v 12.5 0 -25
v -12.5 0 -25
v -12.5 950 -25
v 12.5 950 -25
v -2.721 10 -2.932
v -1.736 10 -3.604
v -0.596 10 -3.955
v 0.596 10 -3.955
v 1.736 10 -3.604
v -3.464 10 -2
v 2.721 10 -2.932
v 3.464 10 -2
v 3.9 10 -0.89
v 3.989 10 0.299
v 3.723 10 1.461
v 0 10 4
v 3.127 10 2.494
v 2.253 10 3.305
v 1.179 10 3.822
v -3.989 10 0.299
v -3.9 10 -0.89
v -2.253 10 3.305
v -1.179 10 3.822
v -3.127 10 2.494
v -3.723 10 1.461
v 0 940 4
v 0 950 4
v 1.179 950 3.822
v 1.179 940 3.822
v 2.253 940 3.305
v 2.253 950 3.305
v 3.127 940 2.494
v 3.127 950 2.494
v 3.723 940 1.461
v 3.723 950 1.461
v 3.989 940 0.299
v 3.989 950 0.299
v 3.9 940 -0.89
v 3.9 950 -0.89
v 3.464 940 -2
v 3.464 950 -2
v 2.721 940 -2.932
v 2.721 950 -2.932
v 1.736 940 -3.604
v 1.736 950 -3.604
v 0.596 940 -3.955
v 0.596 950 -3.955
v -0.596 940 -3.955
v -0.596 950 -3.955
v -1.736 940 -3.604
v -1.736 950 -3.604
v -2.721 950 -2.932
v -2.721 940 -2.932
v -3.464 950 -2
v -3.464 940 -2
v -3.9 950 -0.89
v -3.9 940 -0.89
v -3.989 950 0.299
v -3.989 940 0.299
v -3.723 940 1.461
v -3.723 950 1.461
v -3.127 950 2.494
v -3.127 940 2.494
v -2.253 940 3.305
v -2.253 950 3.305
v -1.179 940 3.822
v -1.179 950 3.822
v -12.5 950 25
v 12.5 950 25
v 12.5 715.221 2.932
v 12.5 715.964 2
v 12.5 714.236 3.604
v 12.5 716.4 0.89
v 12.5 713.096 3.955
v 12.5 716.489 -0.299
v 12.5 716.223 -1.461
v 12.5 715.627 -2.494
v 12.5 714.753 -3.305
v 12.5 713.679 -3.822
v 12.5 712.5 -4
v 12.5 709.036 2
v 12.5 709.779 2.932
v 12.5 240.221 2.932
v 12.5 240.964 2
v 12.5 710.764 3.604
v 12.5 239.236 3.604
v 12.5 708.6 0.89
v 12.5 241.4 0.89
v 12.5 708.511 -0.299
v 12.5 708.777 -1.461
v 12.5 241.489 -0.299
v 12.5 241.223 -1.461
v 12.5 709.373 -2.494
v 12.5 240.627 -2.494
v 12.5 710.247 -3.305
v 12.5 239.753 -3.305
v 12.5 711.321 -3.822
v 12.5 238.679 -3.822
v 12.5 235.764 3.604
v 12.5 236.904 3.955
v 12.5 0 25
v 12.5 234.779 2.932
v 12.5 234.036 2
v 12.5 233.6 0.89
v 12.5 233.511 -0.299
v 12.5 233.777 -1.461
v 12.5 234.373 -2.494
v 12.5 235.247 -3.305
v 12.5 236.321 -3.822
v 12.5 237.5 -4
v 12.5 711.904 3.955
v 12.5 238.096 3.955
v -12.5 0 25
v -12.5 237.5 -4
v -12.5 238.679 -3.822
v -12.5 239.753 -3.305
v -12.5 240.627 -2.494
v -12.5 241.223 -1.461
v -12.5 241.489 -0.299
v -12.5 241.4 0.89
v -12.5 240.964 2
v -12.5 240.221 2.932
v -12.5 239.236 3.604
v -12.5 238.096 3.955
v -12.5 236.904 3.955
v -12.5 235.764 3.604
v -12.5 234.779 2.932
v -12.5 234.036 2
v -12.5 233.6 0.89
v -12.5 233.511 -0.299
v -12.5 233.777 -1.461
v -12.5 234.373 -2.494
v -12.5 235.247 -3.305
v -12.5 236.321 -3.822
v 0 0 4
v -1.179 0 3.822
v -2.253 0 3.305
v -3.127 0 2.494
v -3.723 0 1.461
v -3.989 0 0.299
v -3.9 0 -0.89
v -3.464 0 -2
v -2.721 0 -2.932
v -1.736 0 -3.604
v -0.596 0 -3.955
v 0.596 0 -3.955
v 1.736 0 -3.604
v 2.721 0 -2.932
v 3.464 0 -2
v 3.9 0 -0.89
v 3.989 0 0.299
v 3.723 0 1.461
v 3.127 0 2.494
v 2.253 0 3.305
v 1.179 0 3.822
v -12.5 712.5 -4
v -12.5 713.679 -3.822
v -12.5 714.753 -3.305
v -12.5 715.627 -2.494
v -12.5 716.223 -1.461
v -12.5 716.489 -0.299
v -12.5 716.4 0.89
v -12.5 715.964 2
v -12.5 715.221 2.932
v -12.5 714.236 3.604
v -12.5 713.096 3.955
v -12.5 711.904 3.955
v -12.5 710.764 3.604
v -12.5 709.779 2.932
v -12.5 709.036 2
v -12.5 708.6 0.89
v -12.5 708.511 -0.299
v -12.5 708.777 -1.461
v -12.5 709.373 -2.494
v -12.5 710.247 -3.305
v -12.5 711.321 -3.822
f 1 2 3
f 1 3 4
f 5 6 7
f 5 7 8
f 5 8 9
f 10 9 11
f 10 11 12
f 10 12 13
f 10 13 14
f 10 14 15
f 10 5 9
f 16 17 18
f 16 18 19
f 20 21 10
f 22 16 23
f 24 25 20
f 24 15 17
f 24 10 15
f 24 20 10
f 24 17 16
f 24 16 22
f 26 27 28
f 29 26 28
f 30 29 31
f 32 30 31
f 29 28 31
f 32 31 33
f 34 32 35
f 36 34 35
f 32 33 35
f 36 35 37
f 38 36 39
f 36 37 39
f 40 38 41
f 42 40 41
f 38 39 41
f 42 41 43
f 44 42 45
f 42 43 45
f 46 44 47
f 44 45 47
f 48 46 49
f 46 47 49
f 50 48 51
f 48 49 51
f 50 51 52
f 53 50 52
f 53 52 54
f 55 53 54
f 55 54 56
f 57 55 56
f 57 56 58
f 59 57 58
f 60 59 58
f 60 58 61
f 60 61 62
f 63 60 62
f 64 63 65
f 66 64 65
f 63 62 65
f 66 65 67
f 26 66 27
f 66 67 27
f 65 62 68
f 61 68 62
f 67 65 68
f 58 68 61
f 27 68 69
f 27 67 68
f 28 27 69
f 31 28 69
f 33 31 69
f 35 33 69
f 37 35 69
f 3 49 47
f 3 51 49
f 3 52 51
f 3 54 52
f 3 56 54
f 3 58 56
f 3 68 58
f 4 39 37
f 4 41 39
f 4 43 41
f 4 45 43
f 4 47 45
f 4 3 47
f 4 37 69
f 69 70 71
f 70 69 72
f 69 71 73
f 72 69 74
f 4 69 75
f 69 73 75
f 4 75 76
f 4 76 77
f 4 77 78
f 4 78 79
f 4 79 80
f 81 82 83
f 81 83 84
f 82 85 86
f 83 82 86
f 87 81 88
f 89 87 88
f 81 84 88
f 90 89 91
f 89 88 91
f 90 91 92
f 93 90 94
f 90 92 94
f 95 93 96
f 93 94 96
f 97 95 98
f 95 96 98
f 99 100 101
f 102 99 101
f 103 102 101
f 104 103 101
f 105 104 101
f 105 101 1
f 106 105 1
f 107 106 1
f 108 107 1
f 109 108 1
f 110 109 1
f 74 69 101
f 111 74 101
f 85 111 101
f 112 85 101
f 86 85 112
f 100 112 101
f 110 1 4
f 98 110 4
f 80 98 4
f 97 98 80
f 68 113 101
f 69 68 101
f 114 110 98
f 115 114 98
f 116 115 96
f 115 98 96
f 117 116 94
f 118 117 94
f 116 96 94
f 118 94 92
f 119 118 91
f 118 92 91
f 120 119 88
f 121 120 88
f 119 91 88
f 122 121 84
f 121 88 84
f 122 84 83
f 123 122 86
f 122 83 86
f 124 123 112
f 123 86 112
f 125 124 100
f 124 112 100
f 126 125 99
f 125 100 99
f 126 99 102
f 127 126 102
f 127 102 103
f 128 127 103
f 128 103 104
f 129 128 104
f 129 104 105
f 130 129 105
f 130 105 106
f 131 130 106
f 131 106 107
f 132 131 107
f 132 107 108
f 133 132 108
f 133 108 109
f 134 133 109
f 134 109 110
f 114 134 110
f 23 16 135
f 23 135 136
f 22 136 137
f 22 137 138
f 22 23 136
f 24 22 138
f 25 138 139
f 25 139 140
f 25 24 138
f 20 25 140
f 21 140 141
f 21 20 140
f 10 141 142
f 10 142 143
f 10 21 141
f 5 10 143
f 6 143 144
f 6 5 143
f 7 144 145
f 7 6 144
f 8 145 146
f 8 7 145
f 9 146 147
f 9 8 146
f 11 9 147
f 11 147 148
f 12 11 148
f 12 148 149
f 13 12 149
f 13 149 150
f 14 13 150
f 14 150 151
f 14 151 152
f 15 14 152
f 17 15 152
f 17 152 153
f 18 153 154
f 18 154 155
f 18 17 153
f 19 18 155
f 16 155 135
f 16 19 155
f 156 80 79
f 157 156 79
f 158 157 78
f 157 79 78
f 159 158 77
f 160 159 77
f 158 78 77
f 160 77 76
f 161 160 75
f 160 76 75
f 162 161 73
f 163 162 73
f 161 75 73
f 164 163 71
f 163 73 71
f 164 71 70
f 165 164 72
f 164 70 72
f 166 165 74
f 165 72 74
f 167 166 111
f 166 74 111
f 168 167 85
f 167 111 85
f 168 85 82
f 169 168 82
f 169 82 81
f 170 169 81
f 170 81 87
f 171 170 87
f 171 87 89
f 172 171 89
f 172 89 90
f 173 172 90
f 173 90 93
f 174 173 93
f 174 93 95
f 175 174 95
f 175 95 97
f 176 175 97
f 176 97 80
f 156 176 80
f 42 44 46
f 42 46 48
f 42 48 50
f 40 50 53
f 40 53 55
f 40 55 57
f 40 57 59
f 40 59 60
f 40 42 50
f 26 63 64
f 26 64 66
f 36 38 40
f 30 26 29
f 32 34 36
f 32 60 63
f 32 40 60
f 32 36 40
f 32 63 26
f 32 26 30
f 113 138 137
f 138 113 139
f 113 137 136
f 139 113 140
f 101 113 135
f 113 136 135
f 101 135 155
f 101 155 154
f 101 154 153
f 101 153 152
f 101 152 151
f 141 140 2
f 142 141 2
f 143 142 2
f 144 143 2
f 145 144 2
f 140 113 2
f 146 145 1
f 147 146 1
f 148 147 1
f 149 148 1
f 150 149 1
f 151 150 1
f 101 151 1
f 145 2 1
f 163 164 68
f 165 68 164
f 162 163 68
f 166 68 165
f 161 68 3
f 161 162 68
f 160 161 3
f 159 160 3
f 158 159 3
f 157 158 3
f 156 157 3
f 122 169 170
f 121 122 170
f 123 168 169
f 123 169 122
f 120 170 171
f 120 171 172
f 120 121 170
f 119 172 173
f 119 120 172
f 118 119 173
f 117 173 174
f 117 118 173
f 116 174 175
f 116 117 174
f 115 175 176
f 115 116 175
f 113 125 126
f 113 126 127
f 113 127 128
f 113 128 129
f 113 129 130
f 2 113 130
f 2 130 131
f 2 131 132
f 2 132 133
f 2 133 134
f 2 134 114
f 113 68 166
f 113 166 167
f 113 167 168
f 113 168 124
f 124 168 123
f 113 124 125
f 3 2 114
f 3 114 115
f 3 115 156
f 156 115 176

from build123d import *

# Parameters (mm, degrees)
SKETCH_1_W          = 25
SKETCH_1_H          = 50
EXTRUDE_1_DEPTH     = 950
SKETCH_2_R          = 4
CUT_EXTRUDE_1_DEPTH = 950
SKETCH_3_R          = 4
CUT_EXTRUDE_2_DEPTH = 10
CUT_EXTRUDE_START   = -10
SKETCH_4_R          = 4
CUT_EXTRUDE_3_DEPTH = 10


with BuildPart() as part:
    # Эскиз1 → Бобышка-Вытянуть1 (new body)
    with BuildSketch(Plane(origin=(0, 0, 0), x_dir=(1, 0, 0), z_dir=(0, 1, 0))):
        Rectangle(SKETCH_1_W, SKETCH_1_H)
    extrude(amount=EXTRUDE_1_DEPTH)

    # Эскиз2 → Вырез-Вытянуть1 (cut)
    with BuildSketch(Plane(origin=(12.5, 0, 0), x_dir=(0, 0, -1), z_dir=(1, 0, 0))):
        with Locations((0, 712.5)):
            Circle(SKETCH_2_R)
        with Locations((0, 237.5)):
            Circle(SKETCH_2_R)
    extrude(amount=-CUT_EXTRUDE_1_DEPTH, mode=Mode.SUBTRACT)

    # Эскиз3 → Вырез-Вытянуть2 (cut)
    with BuildSketch(Plane(origin=(0, 950, 0), x_dir=(1, 0, 0), z_dir=(0, 1, 0))):
        with Locations(Location((0, 0, 0), (0, 0, 270))):
            Circle(SKETCH_3_R)
    extrude(amount=-CUT_EXTRUDE_2_DEPTH, mode=Mode.SUBTRACT)

    # Эскиз4 → Вырез-Вытянуть3 (cut)
    with BuildSketch(Plane.XZ.offset(CUT_EXTRUDE_START)):
        with Locations(Location((0, 0, 0), (0, 0, 90))):
            Circle(SKETCH_4_R)
    extrude(amount=CUT_EXTRUDE_3_DEPTH, mode=Mode.SUBTRACT)


solid = part.part
